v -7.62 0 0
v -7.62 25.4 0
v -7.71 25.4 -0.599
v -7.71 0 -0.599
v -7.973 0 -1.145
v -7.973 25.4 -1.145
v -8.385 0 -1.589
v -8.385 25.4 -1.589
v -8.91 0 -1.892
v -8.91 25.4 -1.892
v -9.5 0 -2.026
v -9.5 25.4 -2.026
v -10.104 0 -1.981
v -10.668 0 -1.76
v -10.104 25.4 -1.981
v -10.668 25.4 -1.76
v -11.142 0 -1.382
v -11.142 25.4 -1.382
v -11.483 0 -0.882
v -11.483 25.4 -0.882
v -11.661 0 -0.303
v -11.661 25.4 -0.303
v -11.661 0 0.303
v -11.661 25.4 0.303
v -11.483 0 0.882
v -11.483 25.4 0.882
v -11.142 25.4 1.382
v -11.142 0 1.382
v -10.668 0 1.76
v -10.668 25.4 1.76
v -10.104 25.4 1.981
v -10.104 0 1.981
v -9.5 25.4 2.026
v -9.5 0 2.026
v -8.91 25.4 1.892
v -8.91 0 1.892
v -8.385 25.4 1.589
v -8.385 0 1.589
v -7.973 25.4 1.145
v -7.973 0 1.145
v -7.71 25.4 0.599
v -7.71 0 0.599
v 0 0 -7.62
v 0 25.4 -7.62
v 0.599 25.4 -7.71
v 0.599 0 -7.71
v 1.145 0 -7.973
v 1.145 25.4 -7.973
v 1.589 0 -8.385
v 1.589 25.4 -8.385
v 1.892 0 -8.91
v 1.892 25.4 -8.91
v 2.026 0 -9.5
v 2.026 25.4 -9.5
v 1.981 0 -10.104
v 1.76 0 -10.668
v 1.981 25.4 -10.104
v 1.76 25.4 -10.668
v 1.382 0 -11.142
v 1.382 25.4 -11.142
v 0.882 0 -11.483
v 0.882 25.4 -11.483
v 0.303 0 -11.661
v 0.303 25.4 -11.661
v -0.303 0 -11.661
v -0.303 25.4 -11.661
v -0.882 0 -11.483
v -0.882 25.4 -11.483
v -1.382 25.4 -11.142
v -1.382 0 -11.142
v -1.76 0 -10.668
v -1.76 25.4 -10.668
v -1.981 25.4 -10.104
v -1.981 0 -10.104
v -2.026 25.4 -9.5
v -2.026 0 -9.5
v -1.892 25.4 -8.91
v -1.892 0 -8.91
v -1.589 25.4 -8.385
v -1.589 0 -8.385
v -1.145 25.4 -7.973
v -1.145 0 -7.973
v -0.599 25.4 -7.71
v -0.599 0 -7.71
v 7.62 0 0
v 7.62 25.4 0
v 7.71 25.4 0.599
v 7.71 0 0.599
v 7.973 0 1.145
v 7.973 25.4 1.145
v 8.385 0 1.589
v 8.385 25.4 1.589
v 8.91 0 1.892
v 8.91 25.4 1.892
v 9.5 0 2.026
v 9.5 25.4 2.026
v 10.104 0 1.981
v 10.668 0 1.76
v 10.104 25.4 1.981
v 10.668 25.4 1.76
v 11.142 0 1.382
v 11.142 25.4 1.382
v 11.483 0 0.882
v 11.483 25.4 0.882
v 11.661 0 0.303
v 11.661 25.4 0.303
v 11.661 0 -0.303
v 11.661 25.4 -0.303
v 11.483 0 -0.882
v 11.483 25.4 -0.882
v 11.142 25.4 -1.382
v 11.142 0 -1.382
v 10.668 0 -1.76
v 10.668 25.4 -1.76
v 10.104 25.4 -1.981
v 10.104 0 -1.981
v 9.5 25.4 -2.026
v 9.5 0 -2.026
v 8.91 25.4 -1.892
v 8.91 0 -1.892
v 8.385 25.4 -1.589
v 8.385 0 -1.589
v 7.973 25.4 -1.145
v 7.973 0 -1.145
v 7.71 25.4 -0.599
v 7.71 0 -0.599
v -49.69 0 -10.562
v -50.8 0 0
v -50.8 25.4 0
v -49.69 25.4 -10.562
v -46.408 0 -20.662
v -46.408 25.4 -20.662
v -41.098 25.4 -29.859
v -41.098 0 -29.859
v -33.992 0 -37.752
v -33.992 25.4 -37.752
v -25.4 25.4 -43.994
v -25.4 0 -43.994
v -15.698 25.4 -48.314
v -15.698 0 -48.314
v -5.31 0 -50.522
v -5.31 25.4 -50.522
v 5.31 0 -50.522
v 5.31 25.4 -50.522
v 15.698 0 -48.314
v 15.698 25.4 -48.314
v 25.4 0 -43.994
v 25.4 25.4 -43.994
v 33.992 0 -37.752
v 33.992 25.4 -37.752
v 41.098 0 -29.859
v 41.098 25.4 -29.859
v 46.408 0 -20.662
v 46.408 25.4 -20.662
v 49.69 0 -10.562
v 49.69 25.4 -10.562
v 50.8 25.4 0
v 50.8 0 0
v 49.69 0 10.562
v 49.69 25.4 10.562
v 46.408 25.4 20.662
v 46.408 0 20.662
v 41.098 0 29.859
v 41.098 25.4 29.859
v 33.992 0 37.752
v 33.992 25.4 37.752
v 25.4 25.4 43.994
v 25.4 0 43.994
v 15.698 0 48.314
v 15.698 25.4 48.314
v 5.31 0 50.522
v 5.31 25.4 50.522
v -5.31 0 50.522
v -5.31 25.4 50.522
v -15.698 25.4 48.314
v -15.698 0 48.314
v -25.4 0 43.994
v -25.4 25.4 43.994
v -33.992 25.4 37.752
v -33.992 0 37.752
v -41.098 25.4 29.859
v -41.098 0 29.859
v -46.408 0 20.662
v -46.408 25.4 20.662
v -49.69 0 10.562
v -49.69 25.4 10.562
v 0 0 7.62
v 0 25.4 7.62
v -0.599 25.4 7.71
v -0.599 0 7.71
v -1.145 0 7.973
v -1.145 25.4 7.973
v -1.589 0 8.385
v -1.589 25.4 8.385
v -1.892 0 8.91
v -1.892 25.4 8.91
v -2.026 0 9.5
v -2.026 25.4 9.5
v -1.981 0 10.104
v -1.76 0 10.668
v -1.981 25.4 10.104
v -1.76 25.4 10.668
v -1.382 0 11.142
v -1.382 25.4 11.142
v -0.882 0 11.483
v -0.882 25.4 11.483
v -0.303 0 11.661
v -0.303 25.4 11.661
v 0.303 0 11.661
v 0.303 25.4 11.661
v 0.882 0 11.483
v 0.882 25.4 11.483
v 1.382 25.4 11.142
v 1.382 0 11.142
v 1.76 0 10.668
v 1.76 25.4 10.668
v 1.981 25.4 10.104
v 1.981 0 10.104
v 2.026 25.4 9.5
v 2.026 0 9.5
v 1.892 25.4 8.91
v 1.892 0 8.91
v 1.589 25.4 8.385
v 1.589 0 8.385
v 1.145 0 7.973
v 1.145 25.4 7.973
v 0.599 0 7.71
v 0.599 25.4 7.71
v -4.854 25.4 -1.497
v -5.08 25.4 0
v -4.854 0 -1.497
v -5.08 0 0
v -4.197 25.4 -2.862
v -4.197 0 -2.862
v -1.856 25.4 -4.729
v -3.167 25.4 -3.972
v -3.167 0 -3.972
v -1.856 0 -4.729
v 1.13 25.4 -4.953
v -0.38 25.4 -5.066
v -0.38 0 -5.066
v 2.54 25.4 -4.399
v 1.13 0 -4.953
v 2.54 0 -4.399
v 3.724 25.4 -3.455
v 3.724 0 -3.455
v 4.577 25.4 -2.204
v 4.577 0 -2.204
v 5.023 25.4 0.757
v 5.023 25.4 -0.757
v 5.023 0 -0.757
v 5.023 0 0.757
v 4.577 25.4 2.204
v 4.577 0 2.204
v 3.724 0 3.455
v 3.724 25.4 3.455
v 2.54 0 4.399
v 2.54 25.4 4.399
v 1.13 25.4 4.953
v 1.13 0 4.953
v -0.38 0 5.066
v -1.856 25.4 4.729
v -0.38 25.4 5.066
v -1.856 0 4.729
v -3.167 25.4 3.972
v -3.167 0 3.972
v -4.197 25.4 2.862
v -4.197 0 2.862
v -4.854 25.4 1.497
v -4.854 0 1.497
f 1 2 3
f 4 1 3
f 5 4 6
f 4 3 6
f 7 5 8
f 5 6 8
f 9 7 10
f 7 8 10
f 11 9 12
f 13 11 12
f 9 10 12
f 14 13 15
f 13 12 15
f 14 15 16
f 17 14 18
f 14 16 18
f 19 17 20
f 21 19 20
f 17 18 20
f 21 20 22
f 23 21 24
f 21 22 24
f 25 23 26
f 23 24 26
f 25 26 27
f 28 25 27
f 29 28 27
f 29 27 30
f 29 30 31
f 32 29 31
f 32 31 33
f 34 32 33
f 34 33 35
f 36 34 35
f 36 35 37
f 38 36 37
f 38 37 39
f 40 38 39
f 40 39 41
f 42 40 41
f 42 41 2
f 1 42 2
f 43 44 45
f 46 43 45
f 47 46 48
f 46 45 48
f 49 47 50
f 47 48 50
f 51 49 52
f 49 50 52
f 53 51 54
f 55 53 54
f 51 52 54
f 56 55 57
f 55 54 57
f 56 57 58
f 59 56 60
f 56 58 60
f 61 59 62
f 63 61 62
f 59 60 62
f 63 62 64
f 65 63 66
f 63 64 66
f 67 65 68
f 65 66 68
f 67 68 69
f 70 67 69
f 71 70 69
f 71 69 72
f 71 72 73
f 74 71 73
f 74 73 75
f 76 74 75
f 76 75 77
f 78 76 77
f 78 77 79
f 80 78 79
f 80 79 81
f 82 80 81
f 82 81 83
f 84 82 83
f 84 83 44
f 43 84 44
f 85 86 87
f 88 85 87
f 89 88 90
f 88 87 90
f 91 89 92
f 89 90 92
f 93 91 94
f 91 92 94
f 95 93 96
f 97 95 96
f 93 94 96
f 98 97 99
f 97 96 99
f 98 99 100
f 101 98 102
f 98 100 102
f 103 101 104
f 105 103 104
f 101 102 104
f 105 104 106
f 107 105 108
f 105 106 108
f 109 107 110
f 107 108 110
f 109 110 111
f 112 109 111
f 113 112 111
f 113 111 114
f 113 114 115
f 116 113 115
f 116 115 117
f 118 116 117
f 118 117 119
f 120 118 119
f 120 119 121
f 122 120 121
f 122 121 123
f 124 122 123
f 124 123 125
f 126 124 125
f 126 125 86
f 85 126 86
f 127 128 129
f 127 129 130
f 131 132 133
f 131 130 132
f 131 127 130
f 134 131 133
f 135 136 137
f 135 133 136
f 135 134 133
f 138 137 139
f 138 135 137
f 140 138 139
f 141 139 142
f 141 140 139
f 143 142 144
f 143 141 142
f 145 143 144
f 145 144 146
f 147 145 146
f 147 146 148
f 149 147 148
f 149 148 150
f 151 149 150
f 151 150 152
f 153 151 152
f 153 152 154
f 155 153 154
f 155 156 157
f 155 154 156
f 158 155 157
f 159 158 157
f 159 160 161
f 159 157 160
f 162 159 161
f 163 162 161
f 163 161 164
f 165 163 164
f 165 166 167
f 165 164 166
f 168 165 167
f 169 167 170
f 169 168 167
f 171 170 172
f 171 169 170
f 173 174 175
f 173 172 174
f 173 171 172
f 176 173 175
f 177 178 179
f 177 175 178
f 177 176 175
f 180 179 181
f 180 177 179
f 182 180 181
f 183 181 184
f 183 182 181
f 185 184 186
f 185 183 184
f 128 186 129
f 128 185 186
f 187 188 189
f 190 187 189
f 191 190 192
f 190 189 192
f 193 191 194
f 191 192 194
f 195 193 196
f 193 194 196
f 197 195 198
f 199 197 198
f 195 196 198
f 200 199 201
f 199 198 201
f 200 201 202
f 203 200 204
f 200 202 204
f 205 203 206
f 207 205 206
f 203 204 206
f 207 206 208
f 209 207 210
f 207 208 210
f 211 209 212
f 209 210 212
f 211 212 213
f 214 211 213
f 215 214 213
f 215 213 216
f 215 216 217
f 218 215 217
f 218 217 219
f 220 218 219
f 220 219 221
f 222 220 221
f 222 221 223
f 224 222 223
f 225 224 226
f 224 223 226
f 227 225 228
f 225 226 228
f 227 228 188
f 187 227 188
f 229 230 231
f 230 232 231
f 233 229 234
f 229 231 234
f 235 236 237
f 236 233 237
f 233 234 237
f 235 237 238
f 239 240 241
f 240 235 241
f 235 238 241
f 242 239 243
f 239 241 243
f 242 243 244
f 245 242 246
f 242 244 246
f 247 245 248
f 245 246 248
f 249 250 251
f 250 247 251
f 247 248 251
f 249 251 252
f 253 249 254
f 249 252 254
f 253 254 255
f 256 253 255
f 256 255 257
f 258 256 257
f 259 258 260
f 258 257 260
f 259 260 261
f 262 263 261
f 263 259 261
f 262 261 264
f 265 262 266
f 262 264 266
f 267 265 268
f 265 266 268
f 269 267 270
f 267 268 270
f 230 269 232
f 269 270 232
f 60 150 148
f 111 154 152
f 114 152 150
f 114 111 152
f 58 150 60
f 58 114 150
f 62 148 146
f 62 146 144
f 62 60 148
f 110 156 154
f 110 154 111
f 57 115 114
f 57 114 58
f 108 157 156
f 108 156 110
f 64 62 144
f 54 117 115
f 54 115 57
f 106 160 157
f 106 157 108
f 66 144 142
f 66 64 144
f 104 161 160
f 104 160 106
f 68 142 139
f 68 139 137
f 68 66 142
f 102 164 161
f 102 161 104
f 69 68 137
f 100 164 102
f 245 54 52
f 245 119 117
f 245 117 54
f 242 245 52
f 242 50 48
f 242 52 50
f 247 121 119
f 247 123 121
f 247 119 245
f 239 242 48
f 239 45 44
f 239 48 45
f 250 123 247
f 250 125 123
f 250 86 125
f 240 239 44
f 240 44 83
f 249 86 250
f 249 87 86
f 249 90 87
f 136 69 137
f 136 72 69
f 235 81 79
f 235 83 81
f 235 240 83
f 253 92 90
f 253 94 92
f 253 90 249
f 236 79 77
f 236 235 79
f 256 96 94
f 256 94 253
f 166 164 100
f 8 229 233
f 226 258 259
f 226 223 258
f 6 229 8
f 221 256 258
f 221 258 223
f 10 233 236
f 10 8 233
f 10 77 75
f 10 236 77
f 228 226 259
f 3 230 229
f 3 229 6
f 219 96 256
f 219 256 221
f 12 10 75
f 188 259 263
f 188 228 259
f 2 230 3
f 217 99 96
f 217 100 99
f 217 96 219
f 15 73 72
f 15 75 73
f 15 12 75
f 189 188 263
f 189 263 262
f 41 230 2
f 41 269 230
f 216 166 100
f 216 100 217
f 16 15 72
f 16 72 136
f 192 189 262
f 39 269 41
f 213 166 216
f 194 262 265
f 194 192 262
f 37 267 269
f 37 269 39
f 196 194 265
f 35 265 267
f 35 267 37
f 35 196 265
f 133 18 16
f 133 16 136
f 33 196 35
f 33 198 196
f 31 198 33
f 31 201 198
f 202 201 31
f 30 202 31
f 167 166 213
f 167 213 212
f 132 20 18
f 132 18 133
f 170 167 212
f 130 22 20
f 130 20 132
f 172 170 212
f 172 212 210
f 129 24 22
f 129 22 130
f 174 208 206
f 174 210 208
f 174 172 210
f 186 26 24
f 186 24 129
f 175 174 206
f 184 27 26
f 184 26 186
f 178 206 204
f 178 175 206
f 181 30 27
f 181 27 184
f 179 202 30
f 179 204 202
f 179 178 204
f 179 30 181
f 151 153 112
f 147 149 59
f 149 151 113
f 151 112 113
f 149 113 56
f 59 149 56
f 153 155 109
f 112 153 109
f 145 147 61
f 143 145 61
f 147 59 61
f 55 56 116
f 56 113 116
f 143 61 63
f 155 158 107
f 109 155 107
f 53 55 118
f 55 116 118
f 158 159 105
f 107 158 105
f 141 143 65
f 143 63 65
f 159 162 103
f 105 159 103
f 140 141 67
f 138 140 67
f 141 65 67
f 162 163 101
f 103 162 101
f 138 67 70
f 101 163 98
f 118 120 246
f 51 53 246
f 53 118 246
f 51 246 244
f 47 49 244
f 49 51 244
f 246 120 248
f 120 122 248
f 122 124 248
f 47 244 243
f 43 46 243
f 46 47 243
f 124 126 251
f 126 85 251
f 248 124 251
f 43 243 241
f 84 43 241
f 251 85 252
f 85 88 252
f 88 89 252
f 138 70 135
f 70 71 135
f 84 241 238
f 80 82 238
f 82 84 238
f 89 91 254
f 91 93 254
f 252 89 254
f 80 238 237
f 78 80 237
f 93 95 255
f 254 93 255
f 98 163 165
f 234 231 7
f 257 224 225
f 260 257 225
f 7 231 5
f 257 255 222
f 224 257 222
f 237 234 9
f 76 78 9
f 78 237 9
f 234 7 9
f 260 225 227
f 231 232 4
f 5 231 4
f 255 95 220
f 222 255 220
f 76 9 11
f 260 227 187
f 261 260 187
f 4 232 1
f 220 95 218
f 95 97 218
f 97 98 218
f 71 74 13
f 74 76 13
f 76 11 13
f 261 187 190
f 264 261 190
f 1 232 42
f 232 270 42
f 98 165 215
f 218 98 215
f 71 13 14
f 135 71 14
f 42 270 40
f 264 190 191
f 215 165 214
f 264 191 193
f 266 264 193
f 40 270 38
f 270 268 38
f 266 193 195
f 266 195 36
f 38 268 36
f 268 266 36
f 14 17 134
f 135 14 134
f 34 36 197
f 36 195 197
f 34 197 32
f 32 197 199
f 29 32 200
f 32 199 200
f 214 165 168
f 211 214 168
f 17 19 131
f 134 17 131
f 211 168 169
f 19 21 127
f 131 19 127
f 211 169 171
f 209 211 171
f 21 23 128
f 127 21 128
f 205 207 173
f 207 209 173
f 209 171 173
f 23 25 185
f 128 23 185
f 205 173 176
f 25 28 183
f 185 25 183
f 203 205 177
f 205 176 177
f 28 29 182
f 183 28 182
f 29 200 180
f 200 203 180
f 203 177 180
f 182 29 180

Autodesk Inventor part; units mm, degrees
ref_plane "YZ Plane" through (0, 0, 0) normal (1, 0, 0) x (0, 1, 0)
ref_plane "XZ Plane" through (0, 0, 0) normal (0, 1, 0) x (-1, 0, 0)
ref_plane "XY Plane" through (0, 0, 0) normal (0, 0, 1) x (1, 0, 0)
sketch "Sketch1" plane through (0, 0, 0) normal (0, 1, 0) x (-1, 0, 0)
  circle A0 centre (0, 0) radius 50.8
  circle A1 centre (0, 0) radius 5.08
  dimension "d0" = 101.6
  dimension "d1" = 10.16
extrude "Extrusion1" add sketch "Sketch1" along normal blind 25.4
sketch "Sketch2" plane through (0, 25.4, 0) normal (0, 1, 0) x (1, 0, 0)
  circle A0 centre (0, 0) radius 5.08 projected
  line L0 (-5.08, 0) -> (-9.652, 0)
  circle A1 centre (-9.652, 0) radius 2.032
  dimension "d4" = 4.572
  dimension "d5" = 4.064
extrude "Extrusion2" cut sketch "Sketch2" against normal blind 25.4 contours A1
sketch "Sketch3" plane through (0, 25.4, 0) normal (0, 1, 0) x (1, 0, 0)
  point P0 (0, 0)
  point P1 (0, 0)
pattern_circular "Circular Pattern1" count 4 over 360 about axis through (0, 25.4, 0) along (0, 1, 0) of "Extrusion2"
properties part number "w"
